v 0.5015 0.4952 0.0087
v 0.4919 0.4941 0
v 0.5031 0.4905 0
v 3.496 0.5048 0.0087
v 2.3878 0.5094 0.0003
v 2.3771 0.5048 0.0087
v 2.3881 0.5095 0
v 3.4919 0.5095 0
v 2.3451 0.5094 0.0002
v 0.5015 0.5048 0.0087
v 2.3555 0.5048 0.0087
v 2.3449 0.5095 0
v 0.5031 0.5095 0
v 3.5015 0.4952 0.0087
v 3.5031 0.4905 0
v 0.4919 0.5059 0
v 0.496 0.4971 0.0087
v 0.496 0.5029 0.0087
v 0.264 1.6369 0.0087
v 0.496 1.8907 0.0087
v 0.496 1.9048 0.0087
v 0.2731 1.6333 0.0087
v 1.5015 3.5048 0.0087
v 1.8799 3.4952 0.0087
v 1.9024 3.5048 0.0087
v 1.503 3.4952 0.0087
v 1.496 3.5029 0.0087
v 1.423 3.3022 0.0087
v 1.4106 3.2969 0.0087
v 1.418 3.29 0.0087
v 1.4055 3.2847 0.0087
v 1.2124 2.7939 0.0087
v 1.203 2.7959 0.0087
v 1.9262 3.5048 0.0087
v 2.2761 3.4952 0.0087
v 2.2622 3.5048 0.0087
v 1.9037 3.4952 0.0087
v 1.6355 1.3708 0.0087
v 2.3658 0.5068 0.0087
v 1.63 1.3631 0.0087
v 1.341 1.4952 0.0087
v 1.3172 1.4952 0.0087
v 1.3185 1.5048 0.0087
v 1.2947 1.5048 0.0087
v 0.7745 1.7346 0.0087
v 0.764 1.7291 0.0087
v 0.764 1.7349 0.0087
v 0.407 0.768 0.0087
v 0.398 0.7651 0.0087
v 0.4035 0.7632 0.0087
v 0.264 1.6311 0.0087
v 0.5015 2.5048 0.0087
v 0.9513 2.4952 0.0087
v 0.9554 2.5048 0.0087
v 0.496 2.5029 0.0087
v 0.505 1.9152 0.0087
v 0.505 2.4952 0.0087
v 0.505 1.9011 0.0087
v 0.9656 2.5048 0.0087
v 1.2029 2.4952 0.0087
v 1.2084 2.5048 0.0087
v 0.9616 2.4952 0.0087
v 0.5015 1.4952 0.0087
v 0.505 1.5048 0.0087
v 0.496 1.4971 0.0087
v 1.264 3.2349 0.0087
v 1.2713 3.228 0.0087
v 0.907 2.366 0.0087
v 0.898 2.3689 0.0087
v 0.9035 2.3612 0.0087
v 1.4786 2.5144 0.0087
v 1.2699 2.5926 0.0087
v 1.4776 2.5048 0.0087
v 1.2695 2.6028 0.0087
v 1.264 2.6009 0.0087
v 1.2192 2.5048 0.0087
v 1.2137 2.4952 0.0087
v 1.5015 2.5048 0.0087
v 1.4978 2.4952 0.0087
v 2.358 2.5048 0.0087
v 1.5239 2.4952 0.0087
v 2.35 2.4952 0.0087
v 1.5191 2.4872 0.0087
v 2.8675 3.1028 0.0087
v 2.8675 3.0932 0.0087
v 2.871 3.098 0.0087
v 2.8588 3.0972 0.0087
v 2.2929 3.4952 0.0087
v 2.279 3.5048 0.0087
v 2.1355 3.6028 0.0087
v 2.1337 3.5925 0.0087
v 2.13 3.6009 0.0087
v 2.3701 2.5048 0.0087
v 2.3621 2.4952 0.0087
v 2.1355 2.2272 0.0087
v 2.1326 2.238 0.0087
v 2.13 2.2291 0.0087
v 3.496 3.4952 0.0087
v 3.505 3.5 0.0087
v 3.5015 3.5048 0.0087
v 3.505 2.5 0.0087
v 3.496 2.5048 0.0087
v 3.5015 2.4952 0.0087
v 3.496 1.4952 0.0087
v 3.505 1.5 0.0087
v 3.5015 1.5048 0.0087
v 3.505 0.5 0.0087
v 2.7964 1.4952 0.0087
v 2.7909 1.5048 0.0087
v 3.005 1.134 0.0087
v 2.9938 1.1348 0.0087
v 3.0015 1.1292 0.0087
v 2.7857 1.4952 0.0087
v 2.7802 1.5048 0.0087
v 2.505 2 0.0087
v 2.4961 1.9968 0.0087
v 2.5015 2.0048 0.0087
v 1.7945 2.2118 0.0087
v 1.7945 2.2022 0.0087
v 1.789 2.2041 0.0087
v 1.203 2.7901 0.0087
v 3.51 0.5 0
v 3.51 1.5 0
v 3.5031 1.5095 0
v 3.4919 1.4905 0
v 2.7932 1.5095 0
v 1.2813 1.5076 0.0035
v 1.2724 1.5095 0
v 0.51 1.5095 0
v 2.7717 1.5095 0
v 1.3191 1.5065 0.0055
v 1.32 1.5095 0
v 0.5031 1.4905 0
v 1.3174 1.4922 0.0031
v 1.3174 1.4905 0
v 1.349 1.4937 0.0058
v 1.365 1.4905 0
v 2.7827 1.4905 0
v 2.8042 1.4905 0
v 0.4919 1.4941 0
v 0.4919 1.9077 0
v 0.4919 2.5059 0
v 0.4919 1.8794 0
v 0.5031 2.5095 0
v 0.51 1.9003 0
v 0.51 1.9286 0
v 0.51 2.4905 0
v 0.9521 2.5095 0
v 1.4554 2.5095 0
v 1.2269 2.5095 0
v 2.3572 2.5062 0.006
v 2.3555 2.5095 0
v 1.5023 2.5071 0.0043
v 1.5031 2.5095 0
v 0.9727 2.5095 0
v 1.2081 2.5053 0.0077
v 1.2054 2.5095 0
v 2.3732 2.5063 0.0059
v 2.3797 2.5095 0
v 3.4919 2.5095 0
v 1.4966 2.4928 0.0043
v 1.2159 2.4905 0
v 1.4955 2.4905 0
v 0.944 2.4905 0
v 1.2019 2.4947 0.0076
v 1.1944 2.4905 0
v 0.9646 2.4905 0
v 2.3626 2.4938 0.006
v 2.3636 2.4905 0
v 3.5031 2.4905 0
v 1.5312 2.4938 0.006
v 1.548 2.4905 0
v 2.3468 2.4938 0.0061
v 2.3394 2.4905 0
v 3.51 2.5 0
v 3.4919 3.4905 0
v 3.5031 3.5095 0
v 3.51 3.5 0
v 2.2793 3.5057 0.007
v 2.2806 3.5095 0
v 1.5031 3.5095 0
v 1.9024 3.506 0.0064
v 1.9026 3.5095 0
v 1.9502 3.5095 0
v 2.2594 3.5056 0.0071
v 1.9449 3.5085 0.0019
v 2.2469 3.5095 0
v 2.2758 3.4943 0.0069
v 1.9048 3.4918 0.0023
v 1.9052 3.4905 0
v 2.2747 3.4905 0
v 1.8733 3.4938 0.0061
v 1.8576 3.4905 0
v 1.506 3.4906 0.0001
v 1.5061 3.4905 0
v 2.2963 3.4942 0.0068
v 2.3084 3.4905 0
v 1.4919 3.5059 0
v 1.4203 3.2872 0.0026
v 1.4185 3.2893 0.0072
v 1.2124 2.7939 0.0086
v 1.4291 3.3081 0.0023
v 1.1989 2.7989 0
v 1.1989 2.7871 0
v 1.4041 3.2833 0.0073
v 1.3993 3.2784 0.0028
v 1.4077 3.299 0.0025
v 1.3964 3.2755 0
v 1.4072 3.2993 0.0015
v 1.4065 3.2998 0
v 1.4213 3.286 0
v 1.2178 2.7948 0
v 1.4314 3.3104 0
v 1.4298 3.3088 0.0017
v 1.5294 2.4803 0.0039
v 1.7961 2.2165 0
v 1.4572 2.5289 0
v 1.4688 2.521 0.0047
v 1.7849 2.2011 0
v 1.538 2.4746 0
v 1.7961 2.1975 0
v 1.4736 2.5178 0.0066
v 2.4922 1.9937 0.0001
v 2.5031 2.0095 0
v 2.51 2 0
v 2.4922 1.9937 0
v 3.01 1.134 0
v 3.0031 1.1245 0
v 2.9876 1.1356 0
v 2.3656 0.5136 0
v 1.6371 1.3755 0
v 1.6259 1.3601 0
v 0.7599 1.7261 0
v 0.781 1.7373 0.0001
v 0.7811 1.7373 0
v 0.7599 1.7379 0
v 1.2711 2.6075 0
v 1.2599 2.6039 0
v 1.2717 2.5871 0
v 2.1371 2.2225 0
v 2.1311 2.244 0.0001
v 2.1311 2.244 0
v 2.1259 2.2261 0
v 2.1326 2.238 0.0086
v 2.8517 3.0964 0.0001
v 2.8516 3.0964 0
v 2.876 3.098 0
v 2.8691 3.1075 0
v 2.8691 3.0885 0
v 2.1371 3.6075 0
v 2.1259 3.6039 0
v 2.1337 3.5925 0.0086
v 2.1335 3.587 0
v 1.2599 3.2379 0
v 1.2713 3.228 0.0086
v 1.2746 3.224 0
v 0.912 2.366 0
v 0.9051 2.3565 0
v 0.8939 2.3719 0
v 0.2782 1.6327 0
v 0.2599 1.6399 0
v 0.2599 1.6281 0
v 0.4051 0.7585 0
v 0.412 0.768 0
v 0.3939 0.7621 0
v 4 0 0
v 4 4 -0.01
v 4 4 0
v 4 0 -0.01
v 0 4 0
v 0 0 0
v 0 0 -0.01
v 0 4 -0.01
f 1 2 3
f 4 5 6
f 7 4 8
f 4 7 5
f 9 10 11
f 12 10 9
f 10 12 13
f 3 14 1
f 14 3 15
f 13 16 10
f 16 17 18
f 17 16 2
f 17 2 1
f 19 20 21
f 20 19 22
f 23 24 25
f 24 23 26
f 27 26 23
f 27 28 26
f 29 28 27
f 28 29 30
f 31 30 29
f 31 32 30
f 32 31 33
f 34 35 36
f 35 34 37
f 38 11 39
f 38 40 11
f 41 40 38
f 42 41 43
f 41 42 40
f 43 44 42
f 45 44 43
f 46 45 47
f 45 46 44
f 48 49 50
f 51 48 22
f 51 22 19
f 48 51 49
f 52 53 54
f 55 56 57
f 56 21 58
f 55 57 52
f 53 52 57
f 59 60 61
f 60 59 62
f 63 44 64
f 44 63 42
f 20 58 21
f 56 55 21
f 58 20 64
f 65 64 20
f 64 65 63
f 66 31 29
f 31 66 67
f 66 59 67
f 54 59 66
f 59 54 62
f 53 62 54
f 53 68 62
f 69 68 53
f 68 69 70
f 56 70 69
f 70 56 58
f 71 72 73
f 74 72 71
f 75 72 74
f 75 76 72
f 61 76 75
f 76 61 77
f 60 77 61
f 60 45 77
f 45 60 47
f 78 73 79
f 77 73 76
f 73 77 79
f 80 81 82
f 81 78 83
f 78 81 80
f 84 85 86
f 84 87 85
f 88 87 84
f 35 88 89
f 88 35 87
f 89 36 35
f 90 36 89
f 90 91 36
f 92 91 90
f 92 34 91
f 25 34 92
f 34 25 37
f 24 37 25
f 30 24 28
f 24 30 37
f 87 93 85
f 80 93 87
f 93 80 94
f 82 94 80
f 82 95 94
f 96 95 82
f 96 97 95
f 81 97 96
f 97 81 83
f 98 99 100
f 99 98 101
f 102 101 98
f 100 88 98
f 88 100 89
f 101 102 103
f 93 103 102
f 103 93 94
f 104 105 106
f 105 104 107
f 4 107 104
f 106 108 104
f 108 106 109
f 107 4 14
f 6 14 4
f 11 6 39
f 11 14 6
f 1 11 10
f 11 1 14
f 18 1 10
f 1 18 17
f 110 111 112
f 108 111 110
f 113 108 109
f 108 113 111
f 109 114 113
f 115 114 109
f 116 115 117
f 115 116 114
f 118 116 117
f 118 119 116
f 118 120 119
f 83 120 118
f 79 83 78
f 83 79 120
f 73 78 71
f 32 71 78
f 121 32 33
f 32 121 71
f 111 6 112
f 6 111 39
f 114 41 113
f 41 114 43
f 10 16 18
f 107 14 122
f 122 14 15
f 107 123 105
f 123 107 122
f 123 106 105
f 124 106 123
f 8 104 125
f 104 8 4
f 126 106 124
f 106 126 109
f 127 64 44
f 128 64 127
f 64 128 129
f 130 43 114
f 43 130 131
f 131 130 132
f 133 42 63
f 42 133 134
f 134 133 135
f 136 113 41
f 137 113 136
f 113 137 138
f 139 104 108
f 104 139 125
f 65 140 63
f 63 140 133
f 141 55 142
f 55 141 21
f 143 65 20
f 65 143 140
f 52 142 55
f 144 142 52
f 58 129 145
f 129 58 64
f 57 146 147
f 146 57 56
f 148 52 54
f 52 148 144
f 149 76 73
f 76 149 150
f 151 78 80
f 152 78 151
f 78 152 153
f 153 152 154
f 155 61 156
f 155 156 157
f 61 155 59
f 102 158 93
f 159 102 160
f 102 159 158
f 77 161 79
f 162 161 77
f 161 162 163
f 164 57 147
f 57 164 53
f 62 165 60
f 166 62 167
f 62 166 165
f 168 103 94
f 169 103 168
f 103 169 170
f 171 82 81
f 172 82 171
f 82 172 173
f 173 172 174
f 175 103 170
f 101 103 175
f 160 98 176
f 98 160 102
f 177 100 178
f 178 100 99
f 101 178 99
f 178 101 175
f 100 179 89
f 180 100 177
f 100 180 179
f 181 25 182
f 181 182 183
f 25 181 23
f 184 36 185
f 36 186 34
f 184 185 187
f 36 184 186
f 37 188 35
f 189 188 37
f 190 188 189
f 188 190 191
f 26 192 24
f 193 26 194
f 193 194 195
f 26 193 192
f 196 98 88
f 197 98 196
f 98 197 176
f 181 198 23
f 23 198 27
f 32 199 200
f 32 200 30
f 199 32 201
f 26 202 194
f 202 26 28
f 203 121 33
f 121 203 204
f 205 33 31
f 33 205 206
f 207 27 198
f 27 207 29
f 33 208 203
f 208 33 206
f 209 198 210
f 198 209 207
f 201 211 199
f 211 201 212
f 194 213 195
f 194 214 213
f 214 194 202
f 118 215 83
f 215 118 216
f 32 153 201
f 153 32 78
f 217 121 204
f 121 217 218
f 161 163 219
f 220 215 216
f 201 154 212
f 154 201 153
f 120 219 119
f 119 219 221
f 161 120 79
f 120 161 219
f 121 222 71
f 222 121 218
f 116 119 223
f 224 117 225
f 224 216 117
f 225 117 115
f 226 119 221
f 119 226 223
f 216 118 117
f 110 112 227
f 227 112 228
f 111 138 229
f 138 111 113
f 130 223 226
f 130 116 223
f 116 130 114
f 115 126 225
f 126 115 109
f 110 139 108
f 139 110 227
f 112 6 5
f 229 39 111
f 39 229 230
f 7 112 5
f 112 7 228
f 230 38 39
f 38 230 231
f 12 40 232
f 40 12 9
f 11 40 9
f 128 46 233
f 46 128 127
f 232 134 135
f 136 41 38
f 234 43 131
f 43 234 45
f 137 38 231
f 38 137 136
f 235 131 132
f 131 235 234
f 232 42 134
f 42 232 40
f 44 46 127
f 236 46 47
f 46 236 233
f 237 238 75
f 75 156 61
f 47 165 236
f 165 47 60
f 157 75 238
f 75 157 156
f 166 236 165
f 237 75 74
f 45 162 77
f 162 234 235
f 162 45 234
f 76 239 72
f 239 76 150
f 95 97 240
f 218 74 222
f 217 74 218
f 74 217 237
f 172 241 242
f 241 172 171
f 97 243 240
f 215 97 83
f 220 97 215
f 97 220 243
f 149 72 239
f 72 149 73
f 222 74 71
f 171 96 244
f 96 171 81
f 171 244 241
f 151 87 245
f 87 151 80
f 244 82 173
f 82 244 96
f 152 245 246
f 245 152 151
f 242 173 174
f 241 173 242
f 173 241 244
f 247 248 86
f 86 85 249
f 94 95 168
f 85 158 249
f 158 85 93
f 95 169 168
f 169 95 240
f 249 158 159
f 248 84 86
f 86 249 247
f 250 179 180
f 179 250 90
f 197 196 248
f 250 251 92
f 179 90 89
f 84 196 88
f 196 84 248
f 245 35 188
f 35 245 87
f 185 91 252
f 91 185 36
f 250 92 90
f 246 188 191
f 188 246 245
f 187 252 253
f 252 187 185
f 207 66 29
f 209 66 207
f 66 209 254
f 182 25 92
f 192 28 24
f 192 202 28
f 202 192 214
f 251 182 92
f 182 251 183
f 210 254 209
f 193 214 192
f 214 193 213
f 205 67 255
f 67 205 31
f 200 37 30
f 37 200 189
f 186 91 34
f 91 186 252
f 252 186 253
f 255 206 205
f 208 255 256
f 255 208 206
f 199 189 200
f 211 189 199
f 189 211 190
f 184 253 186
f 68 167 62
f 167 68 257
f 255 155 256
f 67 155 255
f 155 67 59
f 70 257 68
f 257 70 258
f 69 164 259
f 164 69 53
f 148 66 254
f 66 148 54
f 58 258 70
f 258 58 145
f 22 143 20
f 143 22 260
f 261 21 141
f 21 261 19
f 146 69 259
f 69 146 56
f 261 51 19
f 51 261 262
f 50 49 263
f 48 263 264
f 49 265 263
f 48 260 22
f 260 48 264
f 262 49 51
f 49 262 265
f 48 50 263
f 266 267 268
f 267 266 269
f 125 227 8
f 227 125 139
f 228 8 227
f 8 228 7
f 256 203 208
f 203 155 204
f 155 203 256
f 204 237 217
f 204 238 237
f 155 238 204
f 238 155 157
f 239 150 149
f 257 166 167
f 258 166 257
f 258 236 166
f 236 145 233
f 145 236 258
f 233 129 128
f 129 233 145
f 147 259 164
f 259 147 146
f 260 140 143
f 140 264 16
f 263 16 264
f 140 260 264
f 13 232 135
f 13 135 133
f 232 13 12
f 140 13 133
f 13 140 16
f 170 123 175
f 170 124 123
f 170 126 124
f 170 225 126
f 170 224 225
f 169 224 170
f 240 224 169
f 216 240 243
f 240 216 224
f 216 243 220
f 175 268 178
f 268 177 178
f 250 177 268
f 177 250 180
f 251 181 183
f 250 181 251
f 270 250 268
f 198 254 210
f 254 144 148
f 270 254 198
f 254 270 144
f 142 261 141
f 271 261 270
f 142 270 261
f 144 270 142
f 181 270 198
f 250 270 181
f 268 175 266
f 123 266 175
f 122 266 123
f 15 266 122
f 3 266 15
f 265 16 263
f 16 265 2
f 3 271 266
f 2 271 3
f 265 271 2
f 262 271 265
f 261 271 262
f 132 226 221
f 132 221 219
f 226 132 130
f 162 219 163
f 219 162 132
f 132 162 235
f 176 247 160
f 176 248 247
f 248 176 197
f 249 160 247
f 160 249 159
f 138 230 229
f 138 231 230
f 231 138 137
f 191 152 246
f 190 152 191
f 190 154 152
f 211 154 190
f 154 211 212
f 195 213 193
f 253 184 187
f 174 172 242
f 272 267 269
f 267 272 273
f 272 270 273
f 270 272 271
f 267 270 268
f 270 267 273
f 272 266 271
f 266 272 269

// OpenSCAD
hull(){
    translate([0.5, 0.5]) sphere(0.01);
    translate([1.5, 0.5]) sphere(0.01);
}
hull(){
    translate([1.5, 0.5]) sphere(0.01);
    translate([2.5, 0.5]) sphere(0.01);
}
hull(){
    translate([2.5, 0.5]) sphere(0.01);
    translate([3.5, 0.5]) sphere(0.01);
}
hull(){
    translate([3.5, 0.5]) sphere(0.01);
    translate([3.5, 1.5]) sphere(0.01);
}
hull(){
    translate([3.5, 1.5]) sphere(0.01);
    translate([2.5, 1.5]) sphere(0.01);
}
hull(){
    translate([2.5, 1.5]) sphere(0.01);
    translate([1.5, 1.5]) sphere(0.01);
}
hull(){
    translate([1.5, 1.5]) sphere(0.01);
    translate([0.5, 1.5]) sphere(0.01);
}
hull(){
    translate([0.5, 1.5]) sphere(0.01);
    translate([0.5, 2.5]) sphere(0.01);
}
hull(){
    translate([0.5, 2.5]) sphere(0.01);
    translate([1.5, 2.5]) sphere(0.01);
}
hull(){
    translate([1.5, 2.5]) sphere(0.01);
    translate([2.5, 2.5]) sphere(0.01);
}
hull(){
    translate([2.5, 2.5]) sphere(0.01);
    translate([3.5, 2.5]) sphere(0.01);
}
hull(){
    translate([3.5, 2.5]) sphere(0.01);
    translate([3.5, 3.5]) sphere(0.01);
}
hull(){
    translate([3.5, 3.5]) sphere(0.01);
    translate([2.5, 3.5]) sphere(0.01);
}
hull(){
    translate([2.5, 3.5]) sphere(0.01);
    translate([1.5, 3.5]) sphere(0.01);
}
hull(){
    translate([1.5, 3.5]) sphere(0.01);
    translate([1.207, 2.793]) sphere(0.01);
}
hull(){
    translate([1.207, 2.793]) sphere(0.01);
    translate([1.793, 2.207]) sphere(0.01);
}
hull(){
    translate([1.793, 2.207]) sphere(0.01);
    translate([2.5, 2.0]) sphere(0.01);
}
hull(){
    translate([2.5, 2.0]) sphere(0.01);
    translate([3.0, 1.134]) sphere(0.01);
}
hull(){
    translate([3.0, 1.134]) sphere(0.01);
    translate([2.366, 0.5]) sphere(0.01);
}
hull(){
    translate([2.366, 0.5]) sphere(0.01);
    translate([1.634, 1.366]) sphere(0.01);
}
hull(){
    translate([1.634, 1.366]) sphere(0.01);
    translate([0.768, 1.732]) sphere(0.01);
}
hull(){
    translate([0.768, 1.732]) sphere(0.01);
    translate([1.268, 2.598]) sphere(0.01);
}
hull(){
    translate([1.268, 2.598]) sphere(0.01);
    translate([2.134, 2.232]) sphere(0.01);
}
hull(){
    translate([2.134, 2.232]) sphere(0.01);
    translate([2.866, 3.098]) sphere(0.01);
}
hull(){
    translate([2.866, 3.098]) sphere(0.01);
    translate([2.134, 3.598]) sphere(0.01);
}
hull(){
    translate([2.134, 3.598]) sphere(0.01);
    translate([1.268, 3.232]) sphere(0.01);
}
hull(){
    translate([1.268, 3.232]) sphere(0.01);
    translate([0.902, 2.366]) sphere(0.01);
}
hull(){
    translate([0.902, 2.366]) sphere(0.01);
    translate([0.268, 1.634]) sphere(0.01);
}
hull(){
    translate([0.268, 1.634]) sphere(0.01);
    translate([0.402, 0.768]) sphere(0.01);
}
translate([0,0,-0.01]) color([0.1,0.1,0.1]) cube([4,4,0.01]);
